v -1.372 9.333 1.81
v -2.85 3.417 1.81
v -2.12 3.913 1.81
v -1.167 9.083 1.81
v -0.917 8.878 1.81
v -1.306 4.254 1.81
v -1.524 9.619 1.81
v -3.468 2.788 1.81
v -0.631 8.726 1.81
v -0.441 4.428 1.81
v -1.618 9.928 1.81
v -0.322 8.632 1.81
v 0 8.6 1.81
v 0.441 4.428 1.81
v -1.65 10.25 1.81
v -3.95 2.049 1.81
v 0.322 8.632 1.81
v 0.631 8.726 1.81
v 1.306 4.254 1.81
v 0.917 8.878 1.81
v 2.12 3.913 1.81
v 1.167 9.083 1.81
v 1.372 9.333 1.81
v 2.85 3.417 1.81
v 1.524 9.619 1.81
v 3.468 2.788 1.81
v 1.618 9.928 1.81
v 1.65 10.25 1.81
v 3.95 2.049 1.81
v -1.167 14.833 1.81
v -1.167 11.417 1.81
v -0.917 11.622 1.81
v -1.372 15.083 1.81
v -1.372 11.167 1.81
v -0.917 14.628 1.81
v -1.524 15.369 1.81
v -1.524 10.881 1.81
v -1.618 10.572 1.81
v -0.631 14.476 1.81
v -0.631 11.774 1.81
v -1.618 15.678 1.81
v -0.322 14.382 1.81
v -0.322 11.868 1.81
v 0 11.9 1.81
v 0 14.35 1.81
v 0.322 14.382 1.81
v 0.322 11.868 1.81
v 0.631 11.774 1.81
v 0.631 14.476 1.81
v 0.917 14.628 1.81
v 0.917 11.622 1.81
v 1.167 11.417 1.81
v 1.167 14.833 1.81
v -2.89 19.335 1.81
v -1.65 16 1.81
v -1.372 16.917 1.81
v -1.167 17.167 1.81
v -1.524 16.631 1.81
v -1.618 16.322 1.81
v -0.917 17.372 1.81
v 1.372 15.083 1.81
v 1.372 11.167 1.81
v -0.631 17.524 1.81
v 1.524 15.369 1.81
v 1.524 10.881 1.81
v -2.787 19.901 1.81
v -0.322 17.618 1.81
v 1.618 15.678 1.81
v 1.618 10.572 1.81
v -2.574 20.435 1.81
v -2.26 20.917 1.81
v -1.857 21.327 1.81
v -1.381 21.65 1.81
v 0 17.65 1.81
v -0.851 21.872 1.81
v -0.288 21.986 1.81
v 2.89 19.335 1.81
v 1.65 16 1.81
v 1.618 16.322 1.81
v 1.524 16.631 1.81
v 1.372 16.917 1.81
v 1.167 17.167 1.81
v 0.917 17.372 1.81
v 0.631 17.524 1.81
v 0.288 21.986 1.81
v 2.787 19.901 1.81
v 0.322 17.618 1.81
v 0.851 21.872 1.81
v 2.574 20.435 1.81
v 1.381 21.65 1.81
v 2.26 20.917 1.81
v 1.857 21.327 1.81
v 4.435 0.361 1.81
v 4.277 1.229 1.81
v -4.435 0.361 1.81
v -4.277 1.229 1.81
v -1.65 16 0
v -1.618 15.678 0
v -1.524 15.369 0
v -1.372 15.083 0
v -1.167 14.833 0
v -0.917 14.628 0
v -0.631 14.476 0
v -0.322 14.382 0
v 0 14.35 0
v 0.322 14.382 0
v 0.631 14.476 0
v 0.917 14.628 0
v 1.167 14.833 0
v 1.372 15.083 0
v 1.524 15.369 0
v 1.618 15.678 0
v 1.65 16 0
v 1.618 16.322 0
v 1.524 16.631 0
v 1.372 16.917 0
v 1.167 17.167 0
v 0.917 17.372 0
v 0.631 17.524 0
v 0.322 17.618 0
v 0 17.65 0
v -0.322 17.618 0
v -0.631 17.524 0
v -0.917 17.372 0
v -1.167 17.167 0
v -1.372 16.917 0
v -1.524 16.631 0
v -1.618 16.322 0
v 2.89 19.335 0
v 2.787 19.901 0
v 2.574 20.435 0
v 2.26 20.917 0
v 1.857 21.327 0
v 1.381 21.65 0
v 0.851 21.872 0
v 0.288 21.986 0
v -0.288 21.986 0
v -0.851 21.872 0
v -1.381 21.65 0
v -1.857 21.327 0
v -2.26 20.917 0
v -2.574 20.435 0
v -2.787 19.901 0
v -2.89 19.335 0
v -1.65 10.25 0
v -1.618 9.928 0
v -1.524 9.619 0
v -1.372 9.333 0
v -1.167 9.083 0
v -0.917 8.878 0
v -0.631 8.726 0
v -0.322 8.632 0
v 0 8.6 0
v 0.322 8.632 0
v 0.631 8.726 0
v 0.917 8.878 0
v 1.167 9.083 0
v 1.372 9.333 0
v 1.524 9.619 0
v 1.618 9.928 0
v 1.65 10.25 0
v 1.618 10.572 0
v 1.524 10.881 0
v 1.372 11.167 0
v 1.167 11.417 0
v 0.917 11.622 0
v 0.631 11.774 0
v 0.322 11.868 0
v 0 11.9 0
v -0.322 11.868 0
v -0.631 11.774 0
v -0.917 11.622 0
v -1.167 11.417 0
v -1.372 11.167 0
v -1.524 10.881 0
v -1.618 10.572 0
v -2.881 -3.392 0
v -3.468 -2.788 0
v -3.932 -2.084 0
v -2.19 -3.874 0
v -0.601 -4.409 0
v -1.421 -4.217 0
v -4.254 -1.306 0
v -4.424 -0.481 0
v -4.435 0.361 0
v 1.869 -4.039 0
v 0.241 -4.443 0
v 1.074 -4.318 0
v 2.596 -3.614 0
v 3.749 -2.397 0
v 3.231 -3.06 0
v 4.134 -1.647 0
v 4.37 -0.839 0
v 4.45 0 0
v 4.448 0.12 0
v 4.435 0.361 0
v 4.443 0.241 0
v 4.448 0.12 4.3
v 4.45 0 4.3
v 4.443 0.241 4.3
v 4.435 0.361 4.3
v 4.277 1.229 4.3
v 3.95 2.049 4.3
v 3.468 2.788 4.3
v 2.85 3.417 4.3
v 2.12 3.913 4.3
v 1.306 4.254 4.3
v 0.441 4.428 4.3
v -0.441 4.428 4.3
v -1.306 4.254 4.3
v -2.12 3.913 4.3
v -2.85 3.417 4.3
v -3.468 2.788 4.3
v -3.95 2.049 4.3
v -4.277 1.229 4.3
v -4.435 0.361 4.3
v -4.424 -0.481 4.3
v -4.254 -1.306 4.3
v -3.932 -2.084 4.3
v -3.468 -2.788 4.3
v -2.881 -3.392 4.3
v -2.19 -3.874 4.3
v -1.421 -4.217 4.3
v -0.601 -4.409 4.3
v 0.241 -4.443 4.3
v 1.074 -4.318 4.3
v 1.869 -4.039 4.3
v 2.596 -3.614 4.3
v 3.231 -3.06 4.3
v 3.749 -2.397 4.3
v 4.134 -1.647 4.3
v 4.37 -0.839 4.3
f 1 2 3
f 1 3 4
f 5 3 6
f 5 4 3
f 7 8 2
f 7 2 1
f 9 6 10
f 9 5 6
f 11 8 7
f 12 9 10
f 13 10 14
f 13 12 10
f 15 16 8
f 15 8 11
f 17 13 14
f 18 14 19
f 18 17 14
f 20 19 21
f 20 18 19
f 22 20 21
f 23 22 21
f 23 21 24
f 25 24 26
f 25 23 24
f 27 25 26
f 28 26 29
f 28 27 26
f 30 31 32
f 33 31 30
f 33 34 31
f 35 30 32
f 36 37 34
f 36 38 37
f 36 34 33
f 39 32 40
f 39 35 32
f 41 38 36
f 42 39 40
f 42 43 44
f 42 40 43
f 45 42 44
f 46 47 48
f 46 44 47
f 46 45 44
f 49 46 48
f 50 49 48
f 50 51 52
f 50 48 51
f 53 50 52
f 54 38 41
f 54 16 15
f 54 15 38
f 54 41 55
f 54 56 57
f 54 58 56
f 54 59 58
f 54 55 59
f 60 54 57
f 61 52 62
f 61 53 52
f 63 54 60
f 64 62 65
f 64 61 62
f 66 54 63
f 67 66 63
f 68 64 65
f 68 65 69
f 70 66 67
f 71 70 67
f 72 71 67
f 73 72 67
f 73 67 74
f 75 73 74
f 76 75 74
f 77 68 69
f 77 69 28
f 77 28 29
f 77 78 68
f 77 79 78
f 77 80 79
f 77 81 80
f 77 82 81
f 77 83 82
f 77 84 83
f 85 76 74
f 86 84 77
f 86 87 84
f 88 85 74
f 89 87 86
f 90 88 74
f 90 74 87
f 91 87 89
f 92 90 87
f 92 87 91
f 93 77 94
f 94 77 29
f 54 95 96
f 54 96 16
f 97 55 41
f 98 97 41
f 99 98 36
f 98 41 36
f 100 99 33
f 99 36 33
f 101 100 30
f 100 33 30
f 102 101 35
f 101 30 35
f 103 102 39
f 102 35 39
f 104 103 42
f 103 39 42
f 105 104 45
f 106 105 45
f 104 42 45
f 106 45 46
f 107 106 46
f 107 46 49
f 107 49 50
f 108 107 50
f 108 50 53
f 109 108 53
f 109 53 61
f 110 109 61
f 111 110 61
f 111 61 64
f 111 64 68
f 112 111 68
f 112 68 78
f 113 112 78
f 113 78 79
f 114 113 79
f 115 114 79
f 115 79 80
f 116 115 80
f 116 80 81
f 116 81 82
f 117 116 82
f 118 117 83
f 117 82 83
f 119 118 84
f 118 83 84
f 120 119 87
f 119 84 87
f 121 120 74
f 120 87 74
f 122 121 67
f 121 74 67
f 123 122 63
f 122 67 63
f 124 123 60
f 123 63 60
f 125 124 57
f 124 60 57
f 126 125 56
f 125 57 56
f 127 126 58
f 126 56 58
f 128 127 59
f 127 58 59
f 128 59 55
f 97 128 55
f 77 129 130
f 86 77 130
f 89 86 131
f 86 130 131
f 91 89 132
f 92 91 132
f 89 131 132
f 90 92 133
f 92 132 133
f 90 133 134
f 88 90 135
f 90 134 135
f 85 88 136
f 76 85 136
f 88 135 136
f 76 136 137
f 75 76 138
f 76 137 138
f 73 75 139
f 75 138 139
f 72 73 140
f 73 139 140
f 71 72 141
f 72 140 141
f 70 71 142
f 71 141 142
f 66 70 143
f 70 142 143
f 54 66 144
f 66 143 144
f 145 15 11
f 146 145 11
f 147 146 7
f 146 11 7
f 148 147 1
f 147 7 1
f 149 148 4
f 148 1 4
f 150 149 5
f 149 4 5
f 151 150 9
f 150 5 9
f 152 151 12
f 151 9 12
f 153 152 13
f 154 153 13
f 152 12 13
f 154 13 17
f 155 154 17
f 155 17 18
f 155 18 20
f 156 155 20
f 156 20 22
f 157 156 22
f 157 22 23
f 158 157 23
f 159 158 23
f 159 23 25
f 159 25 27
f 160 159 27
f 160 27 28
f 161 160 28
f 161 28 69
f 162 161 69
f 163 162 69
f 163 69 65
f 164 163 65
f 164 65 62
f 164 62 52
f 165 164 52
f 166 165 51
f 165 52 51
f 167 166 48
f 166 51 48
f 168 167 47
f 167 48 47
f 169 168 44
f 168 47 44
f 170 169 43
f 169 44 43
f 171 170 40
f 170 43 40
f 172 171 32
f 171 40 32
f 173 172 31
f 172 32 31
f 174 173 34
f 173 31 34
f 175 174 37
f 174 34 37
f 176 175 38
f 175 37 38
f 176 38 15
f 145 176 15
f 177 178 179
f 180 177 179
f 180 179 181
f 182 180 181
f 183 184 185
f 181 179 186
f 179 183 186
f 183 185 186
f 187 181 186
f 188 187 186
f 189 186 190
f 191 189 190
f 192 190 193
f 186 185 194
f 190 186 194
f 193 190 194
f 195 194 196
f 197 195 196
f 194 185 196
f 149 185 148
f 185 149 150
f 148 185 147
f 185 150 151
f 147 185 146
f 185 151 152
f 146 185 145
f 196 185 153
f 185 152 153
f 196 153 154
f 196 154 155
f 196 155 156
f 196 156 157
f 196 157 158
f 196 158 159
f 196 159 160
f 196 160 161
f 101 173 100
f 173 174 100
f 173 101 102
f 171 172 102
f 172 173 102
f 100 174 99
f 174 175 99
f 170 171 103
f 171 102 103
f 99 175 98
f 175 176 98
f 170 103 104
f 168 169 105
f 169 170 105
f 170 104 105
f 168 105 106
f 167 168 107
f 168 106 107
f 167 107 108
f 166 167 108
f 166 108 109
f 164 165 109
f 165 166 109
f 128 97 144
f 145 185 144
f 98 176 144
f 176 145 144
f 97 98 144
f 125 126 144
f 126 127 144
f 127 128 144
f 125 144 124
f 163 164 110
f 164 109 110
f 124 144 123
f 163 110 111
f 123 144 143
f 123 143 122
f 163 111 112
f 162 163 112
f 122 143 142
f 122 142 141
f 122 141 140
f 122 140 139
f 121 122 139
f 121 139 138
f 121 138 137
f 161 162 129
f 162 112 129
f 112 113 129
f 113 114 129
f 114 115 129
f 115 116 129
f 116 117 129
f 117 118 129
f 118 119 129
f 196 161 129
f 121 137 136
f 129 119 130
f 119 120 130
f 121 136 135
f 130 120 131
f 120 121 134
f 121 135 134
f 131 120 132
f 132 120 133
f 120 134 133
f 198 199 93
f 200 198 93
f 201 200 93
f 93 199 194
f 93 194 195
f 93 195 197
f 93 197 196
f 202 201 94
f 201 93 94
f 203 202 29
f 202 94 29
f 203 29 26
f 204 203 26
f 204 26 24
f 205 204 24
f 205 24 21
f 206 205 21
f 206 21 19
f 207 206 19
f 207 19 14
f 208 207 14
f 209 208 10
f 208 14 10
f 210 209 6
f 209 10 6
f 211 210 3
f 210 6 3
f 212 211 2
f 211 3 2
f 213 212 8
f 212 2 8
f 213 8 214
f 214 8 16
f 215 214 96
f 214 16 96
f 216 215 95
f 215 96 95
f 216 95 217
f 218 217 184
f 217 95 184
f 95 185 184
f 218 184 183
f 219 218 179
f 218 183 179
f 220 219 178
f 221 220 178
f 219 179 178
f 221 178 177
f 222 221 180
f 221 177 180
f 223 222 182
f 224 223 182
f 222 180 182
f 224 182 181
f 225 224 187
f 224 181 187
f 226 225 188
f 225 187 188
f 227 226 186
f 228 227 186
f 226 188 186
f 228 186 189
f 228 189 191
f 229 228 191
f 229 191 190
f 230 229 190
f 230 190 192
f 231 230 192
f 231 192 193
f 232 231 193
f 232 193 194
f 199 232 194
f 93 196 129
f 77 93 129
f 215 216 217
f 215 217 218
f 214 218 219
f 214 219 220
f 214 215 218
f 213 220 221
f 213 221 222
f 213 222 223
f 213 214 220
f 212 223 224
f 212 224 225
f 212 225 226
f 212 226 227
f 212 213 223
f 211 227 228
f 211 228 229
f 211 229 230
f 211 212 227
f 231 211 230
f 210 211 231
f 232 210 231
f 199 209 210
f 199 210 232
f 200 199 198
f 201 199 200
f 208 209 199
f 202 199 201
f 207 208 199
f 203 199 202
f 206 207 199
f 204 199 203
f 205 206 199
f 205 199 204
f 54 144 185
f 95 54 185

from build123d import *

# Parameters (mm, degrees)
F1_DEPTH = 1.81
F2_DEPTH = 4.3
F4_D     = 3.3


with BuildPart() as f1:
    # F0 (on Top) → F1 (new body)
    with BuildSketch(Plane.XY):
        with BuildLine():
            ThreePointArc((-4.4353227912, 0.3611256545), (0, 4.45), (4.4353227912, 0.3611256545))
            Line((4.4353227912, 0.3611256545), (2.8904350774, 19.3353403141))
            ThreePointArc((2.8904350774, 19.3353403141), (0, 22), (-2.8904350774, 19.3353403141))
            Line((-2.8904350774, 19.3353403141), (-4.4353227912, 0.3611256545))
        make_face()
        with BuildLine():
            ThreePointArc((-4.4353227912, 0.3611256545), (-0.1807118969, -4.4463291838), (4.45, 0))
            ThreePointArc((4.45, 0), (4.4463291838, 0.1807118969), (4.4353227912, 0.3611256545))
            ThreePointArc((4.4353227912, 0.3611256545), (0, 4.45), (-4.4353227912, 0.3611256545))
        make_face()
    extrude(amount=F1_DEPTH)

    # F0 (on Top) → F2 (join)
    with BuildSketch(Plane.XY):
        with BuildLine():
            ThreePointArc((-4.4353227912, 0.3611256545), (-0.1807118969, -4.4463291838), (4.45, 0))
            ThreePointArc((4.45, 0), (4.4463291838, 0.1807118969), (4.4353227912, 0.3611256545))
            ThreePointArc((4.4353227912, 0.3611256545), (0, 4.45), (-4.4353227912, 0.3611256545))
        make_face()
    extrude(amount=F2_DEPTH)

    # F4 (through all)
    with Locations(Plane(origin=(0, 0, 0), x_dir=(1, 0, 0), z_dir=(0, 0, -1))):
        with Locations((0, -10.25), (0, -16)):
            Hole(F4_D / 2)


solid = f1.part
